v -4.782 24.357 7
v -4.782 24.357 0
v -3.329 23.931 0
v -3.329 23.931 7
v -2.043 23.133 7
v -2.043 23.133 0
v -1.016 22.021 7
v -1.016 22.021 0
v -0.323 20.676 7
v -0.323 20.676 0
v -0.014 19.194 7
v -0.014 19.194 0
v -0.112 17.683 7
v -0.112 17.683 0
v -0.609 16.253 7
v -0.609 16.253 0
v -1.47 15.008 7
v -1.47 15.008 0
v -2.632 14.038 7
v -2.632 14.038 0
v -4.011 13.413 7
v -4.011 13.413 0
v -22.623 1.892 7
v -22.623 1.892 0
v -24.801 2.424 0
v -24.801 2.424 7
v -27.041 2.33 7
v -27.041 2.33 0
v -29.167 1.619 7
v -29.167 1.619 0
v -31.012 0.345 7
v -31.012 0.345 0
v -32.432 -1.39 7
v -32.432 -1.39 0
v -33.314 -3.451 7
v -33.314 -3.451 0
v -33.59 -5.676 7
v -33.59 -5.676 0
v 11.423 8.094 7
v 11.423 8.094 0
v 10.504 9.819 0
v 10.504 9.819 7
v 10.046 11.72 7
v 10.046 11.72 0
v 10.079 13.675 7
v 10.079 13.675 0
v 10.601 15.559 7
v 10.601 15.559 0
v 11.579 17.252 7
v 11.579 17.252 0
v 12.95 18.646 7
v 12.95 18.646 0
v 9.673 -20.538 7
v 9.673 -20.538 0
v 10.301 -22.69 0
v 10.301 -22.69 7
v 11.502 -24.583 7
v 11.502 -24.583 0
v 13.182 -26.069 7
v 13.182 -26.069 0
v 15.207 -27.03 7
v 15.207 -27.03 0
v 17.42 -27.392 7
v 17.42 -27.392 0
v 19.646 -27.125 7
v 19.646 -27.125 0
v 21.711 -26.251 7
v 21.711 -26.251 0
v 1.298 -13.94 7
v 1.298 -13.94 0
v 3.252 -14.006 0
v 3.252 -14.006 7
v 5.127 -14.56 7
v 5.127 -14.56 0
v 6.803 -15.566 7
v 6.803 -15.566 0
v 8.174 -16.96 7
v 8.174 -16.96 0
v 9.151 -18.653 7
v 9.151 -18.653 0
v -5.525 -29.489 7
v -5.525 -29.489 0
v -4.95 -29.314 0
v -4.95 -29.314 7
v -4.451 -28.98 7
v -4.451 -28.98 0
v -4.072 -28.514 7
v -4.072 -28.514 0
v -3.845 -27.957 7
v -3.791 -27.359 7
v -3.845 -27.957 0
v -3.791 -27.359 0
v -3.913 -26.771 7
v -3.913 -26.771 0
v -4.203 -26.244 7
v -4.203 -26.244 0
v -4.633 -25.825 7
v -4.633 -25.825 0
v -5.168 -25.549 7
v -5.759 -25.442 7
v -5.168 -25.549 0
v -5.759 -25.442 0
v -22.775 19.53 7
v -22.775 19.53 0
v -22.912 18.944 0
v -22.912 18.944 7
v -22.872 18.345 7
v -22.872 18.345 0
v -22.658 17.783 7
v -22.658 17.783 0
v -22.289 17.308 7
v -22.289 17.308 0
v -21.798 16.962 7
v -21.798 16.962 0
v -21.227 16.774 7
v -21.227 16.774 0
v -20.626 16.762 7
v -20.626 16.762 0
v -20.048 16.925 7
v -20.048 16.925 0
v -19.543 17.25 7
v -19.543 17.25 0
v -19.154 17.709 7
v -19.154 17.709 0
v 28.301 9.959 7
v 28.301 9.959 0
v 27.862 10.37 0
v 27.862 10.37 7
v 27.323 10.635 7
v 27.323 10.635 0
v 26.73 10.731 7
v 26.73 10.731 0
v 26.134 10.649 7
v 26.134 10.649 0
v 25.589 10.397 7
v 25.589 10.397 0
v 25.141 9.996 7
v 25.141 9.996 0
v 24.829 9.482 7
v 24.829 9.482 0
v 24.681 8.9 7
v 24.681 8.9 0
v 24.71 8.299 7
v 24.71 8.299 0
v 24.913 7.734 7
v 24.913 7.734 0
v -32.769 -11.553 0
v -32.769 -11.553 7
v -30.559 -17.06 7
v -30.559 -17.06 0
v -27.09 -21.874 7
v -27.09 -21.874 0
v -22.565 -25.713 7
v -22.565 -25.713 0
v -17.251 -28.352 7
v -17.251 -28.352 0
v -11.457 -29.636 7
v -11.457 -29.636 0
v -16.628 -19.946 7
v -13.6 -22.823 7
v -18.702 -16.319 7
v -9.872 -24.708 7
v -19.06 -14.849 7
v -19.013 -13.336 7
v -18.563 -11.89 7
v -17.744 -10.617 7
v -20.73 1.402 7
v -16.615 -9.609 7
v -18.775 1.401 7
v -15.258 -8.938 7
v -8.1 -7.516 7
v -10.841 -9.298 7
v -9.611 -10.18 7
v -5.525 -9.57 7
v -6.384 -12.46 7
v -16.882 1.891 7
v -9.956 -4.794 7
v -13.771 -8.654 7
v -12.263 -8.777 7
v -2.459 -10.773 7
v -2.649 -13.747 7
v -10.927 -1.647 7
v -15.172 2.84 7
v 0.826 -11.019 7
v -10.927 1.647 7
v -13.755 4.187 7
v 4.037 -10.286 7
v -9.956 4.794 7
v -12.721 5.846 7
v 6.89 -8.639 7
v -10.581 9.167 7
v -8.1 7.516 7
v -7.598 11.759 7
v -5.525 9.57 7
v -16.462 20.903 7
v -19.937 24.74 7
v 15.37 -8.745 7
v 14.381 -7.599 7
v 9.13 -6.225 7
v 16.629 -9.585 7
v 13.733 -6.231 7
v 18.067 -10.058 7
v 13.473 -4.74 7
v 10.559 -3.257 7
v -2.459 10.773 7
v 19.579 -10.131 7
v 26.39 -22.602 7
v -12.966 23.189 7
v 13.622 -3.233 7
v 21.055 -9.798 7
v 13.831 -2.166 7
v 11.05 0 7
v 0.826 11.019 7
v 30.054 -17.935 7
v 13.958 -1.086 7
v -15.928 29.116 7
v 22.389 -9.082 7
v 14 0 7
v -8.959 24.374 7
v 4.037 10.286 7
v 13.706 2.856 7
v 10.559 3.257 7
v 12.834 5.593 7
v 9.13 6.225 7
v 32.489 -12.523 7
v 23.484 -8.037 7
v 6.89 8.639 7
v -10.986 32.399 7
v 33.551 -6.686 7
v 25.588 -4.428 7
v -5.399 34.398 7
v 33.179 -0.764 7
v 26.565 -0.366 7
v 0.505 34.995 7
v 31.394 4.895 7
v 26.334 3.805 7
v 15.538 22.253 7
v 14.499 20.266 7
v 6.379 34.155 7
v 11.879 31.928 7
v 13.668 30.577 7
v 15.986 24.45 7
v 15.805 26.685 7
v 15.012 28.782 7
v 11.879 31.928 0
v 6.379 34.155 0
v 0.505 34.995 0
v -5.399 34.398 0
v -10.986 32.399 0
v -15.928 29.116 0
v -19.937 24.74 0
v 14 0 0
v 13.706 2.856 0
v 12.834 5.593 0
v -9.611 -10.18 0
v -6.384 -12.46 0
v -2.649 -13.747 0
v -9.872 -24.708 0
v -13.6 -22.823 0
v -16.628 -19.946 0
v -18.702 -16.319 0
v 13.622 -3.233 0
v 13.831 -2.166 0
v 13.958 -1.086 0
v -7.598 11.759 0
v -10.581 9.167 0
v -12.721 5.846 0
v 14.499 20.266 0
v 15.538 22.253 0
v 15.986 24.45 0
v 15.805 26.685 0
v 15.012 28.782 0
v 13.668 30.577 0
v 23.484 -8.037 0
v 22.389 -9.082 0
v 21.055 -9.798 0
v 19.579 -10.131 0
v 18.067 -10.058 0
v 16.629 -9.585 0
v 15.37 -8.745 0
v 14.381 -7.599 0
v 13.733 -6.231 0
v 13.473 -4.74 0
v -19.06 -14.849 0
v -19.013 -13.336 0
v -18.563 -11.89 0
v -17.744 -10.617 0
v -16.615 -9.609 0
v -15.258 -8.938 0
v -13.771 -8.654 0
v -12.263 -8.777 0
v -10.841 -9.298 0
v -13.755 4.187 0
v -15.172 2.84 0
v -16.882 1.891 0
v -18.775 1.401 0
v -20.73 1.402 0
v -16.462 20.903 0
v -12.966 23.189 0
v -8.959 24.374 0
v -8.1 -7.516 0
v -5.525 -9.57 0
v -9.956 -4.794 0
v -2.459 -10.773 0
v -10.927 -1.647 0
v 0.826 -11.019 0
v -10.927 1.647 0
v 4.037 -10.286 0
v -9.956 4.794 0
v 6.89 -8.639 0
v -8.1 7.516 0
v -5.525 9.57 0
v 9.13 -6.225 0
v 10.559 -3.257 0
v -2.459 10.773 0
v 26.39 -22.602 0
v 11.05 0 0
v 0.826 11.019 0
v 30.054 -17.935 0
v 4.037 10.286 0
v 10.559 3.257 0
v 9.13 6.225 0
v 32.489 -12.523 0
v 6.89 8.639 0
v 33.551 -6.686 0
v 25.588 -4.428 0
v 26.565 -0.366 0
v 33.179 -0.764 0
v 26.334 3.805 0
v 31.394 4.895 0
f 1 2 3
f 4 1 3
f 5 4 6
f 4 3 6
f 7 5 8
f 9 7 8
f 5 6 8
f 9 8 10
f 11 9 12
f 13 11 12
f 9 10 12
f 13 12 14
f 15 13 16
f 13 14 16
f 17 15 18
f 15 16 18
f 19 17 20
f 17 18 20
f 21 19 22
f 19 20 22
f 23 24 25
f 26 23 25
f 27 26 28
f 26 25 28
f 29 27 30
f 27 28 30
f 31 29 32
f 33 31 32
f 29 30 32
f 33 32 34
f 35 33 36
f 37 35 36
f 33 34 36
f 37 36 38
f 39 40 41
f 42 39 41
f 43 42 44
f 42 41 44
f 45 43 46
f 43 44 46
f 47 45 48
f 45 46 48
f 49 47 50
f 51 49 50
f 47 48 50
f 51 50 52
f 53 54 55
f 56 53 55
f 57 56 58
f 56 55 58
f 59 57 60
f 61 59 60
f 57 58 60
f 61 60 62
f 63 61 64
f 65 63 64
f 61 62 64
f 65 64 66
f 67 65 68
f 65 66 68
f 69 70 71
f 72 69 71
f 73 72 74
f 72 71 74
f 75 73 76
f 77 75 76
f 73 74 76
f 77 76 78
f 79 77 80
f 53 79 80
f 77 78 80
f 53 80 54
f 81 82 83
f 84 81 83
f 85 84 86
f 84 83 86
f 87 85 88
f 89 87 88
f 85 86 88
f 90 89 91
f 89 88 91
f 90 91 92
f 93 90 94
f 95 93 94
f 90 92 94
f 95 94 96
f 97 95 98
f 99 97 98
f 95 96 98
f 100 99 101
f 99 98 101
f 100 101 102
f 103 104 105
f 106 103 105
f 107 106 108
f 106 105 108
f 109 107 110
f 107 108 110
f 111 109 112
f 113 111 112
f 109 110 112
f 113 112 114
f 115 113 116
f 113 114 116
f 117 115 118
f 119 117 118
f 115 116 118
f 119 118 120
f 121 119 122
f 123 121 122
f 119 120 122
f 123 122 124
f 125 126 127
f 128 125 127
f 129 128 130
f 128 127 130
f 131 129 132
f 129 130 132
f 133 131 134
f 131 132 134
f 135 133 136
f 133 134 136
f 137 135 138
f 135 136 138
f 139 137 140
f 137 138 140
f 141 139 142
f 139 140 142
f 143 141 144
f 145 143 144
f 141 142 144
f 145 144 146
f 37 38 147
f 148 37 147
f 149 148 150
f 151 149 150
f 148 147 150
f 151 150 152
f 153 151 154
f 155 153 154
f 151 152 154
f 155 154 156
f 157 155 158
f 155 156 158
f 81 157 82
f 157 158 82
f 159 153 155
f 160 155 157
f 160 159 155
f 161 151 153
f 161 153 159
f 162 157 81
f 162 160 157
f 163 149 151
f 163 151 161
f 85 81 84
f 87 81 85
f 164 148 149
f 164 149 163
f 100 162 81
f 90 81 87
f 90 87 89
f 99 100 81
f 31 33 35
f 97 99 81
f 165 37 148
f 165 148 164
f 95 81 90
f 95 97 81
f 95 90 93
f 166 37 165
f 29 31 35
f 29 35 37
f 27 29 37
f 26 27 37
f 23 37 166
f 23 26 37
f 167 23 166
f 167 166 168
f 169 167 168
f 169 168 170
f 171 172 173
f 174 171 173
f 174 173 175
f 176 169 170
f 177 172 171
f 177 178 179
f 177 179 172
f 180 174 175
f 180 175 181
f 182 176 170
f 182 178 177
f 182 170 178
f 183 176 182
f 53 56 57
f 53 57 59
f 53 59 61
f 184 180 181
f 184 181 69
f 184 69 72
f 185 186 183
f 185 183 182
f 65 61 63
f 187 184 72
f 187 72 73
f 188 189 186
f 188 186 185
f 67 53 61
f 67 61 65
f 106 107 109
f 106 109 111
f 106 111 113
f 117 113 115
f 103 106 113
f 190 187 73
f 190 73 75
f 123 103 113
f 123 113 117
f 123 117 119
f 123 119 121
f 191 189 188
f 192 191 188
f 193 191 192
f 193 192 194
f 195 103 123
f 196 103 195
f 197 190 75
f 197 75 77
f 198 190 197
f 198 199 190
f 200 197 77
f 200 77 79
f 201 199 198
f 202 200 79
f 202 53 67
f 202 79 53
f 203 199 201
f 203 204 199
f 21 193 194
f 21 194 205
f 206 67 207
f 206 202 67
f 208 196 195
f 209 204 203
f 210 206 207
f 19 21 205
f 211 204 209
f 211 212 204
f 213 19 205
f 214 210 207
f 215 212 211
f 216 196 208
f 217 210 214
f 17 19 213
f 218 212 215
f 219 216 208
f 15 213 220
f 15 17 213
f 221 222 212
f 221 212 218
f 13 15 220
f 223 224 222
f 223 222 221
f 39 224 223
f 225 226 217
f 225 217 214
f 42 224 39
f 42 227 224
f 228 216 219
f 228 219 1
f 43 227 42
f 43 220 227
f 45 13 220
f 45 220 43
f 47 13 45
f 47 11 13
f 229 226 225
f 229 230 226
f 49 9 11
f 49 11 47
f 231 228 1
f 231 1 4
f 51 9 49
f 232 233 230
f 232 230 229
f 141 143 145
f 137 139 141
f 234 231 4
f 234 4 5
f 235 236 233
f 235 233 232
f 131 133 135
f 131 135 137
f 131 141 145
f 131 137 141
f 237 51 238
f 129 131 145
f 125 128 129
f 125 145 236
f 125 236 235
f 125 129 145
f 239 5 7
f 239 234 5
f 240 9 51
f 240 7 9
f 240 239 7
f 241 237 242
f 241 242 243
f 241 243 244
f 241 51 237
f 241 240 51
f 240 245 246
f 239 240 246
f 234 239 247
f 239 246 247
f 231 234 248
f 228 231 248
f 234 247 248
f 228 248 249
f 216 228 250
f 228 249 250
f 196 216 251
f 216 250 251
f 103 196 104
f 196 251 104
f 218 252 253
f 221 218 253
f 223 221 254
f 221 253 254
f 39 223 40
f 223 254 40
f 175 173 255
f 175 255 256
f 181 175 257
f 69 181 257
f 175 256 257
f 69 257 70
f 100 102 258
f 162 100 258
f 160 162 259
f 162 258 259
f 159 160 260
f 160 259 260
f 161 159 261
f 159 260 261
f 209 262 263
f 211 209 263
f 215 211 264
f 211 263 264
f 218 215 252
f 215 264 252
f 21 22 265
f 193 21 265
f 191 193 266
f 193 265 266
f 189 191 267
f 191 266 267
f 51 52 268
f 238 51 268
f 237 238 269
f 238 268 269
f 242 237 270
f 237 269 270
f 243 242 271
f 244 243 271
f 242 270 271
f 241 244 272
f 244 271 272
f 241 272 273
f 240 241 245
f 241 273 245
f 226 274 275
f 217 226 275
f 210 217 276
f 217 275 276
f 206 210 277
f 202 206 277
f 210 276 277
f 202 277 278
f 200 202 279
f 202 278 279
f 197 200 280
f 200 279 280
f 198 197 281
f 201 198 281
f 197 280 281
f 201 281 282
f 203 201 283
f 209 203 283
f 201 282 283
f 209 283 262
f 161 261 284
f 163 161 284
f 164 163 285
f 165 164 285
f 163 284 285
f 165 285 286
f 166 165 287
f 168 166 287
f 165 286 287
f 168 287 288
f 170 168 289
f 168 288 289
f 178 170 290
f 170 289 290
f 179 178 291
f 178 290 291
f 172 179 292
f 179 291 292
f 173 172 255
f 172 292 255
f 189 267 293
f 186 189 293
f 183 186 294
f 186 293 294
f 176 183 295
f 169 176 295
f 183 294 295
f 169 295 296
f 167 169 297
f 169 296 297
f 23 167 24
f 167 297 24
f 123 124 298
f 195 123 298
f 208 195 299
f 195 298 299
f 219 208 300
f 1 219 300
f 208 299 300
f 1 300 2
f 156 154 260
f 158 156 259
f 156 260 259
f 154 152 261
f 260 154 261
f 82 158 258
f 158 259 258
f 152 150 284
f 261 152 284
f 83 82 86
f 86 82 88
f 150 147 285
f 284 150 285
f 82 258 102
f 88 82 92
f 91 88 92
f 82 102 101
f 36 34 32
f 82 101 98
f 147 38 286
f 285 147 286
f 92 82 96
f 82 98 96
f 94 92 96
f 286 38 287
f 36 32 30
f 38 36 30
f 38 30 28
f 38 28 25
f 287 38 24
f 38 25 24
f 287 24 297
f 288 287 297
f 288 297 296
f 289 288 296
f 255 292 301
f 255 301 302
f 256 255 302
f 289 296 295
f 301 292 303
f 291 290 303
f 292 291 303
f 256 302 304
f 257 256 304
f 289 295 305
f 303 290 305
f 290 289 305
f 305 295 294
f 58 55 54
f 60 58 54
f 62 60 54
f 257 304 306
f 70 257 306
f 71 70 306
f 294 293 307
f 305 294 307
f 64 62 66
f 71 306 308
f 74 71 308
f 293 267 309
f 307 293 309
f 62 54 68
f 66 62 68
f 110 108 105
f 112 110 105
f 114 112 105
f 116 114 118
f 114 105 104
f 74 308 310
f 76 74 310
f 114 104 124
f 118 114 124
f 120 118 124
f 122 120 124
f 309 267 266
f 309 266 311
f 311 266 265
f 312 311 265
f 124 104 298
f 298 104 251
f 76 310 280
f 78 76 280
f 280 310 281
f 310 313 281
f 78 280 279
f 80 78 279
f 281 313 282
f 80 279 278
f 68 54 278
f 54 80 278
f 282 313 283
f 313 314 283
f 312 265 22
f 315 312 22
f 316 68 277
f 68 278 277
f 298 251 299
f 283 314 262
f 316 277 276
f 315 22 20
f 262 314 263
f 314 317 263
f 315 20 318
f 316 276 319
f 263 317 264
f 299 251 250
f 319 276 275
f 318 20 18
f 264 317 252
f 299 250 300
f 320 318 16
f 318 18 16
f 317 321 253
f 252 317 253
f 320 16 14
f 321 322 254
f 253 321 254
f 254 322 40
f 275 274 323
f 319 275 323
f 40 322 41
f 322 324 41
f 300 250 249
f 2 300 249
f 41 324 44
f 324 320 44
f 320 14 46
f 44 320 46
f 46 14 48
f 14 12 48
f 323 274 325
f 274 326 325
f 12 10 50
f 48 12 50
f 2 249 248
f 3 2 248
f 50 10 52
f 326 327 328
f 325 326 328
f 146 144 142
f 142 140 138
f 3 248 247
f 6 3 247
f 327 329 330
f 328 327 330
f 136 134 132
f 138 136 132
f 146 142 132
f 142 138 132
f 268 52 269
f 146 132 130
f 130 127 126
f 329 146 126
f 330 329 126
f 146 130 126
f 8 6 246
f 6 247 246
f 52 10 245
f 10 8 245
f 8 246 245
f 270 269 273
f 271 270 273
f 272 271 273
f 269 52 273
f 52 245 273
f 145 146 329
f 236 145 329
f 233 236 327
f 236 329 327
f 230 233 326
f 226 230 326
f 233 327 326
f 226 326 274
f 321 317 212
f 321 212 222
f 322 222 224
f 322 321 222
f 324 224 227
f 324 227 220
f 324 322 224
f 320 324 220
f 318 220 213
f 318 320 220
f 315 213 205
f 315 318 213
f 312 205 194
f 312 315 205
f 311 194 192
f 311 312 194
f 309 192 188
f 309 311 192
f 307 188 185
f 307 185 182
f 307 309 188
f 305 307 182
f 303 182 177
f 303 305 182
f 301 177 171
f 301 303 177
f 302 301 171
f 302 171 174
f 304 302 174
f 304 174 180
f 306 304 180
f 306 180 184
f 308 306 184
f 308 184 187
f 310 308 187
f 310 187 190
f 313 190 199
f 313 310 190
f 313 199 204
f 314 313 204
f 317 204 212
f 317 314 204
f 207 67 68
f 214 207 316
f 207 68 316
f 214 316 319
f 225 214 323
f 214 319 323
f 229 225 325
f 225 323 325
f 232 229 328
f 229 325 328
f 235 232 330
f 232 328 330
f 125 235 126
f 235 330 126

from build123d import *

# Parameters (mm, degrees)
F0_R     = 11.05
F1_DEPTH = 7


# Not quite as in the source:
# - a feature names something its author has since deleted; it is built from what else it names


with BuildPart() as f1:
    # F0 (on Top) → F1 (new body)
    with BuildSketch(Plane.XY):
        with BuildLine():
            ThreePointArc((-4.0106673609, 13.4132228536), (4.561996815, 13.2358673709), (11.4233995183, 8.0935742071))
            ThreePointArc((11.4233995183, 8.0935742071), (10.0789971933, 13.6745719731), (12.9496720608, 18.6459077574))
            ThreePointArc((12.9496720608, 18.6459077574), (15.9741224369, 25.5738093143), (11.8787878788, 31.9276549937))
            ThreePointArc((11.8787878788, 31.9276549937), (-8.2529606774, 33.568130398), (-22.7753295029, 19.5296382006))
            ThreePointArc((-22.7753295029, 19.5296382006), (-21.7981073273, 16.9621679379), (-19.1543041216, 17.7086070442))
            ThreePointArc((-19.1543041216, 17.7086070442), (-12.9655505969, 23.1890748663), (-4.7818295921, 24.3565114828))
            ThreePointArc((-4.7818295921, 24.3565114828), (-0.0139046539, 19.1936864048), (-4.0106673609, 13.4132228536))
        make_face()
        with BuildLine():
            ThreePointArc((13.6215254183, -3.2332716061), (13.9050594363, -1.6276738223), (14, 0))
            ThreePointArc((14, 0), (13.3403072164, 4.2469051522), (11.4233995183, 8.0935742071))
            ThreePointArc((11.4233995183, 8.0935742071), (4.561996815, 13.2358673709), (-4.0106673609, 13.4132228536))
            ThreePointArc((-4.0106673609, 13.4132228536), (-9.1815989768, 10.5687388192), (-12.7209406299, 5.8461670769))
            ThreePointArc((-12.7209406299, 5.8461670769), (-13.7435957918, -2.6671285517), (-9.6108580574, -10.1799512475))
            ThreePointArc((-9.6108580574, -10.1799512475), (-4.561996815, -13.2358673709), (1.2975411116, -13.939741284))
            ThreePointArc((1.2975411116, -13.939741284), (9.1815989768, -10.5687388192), (13.6215254183, -3.2332716061))
        make_face()
        Circle(F0_R, mode=Mode.SUBTRACT)
        with BuildLine():
            ThreePointArc((-9.6108580574, -10.1799512475), (-13.7435957918, -2.6671285517), (-12.7209406299, 5.8461670769))
            ThreePointArc((-12.7209406299, 5.8461670769), (-16.8820253112, 1.8913816276), (-22.6226658249, 1.8917910967))
            ThreePointArc((-22.6226658249, 1.8917910967), (-30.1346297562, 1.0470911764), (-33.5895542472, -5.6764954277))
            ThreePointArc((-33.5895542472, -5.6764954277), (-24.9443733435, -23.931338802), (-5.5254980569, -29.4888330294))
            ThreePointArc((-5.5254980569, -29.4888330294), (-3.7906146738, -27.3587986688), (-5.7589515051, -25.4424174832))
            ThreePointArc((-5.7589515051, -25.4424174832), (-13.5995526261, -22.8230336242), (-18.7024428957, -16.3194416447))
            ThreePointArc((-18.7024428957, -16.3194416447), (-16.6152676918, -9.6088849859), (-9.6108580574, -10.1799512475))
        make_face()
        with BuildLine():
            ThreePointArc((23.4842724877, -8.0370698381), (16.6291723457, -9.5848014189), (13.6215254183, -3.2332716061))
            ThreePointArc((13.6215254183, -3.2332716061), (9.1815989768, -10.5687388192), (1.2975411116, -13.939741284))
            ThreePointArc((1.2975411116, -13.939741284), (6.8030281179, -15.5659536006), (9.6729937641, -20.537698854))
            ThreePointArc((9.6729937641, -20.537698854), (14.1605073193, -26.6209004907), (21.7107663685, -26.2511595661))
            ThreePointArc((21.7107663685, -26.2511595661), (33.1973340209, -9.6367915959), (28.3008275599, 9.9591948288))
            ThreePointArc((28.3008275599, 9.9591948288), (25.5887220011, 10.3966307309), (24.9132556267, 7.733810439))
            ThreePointArc((24.9132556267, 7.733810439), (26.565103223, -0.3660412422), (23.4842724877, -8.0370698381))
        make_face()
    extrude(amount=F1_DEPTH)


solid = f1.part
